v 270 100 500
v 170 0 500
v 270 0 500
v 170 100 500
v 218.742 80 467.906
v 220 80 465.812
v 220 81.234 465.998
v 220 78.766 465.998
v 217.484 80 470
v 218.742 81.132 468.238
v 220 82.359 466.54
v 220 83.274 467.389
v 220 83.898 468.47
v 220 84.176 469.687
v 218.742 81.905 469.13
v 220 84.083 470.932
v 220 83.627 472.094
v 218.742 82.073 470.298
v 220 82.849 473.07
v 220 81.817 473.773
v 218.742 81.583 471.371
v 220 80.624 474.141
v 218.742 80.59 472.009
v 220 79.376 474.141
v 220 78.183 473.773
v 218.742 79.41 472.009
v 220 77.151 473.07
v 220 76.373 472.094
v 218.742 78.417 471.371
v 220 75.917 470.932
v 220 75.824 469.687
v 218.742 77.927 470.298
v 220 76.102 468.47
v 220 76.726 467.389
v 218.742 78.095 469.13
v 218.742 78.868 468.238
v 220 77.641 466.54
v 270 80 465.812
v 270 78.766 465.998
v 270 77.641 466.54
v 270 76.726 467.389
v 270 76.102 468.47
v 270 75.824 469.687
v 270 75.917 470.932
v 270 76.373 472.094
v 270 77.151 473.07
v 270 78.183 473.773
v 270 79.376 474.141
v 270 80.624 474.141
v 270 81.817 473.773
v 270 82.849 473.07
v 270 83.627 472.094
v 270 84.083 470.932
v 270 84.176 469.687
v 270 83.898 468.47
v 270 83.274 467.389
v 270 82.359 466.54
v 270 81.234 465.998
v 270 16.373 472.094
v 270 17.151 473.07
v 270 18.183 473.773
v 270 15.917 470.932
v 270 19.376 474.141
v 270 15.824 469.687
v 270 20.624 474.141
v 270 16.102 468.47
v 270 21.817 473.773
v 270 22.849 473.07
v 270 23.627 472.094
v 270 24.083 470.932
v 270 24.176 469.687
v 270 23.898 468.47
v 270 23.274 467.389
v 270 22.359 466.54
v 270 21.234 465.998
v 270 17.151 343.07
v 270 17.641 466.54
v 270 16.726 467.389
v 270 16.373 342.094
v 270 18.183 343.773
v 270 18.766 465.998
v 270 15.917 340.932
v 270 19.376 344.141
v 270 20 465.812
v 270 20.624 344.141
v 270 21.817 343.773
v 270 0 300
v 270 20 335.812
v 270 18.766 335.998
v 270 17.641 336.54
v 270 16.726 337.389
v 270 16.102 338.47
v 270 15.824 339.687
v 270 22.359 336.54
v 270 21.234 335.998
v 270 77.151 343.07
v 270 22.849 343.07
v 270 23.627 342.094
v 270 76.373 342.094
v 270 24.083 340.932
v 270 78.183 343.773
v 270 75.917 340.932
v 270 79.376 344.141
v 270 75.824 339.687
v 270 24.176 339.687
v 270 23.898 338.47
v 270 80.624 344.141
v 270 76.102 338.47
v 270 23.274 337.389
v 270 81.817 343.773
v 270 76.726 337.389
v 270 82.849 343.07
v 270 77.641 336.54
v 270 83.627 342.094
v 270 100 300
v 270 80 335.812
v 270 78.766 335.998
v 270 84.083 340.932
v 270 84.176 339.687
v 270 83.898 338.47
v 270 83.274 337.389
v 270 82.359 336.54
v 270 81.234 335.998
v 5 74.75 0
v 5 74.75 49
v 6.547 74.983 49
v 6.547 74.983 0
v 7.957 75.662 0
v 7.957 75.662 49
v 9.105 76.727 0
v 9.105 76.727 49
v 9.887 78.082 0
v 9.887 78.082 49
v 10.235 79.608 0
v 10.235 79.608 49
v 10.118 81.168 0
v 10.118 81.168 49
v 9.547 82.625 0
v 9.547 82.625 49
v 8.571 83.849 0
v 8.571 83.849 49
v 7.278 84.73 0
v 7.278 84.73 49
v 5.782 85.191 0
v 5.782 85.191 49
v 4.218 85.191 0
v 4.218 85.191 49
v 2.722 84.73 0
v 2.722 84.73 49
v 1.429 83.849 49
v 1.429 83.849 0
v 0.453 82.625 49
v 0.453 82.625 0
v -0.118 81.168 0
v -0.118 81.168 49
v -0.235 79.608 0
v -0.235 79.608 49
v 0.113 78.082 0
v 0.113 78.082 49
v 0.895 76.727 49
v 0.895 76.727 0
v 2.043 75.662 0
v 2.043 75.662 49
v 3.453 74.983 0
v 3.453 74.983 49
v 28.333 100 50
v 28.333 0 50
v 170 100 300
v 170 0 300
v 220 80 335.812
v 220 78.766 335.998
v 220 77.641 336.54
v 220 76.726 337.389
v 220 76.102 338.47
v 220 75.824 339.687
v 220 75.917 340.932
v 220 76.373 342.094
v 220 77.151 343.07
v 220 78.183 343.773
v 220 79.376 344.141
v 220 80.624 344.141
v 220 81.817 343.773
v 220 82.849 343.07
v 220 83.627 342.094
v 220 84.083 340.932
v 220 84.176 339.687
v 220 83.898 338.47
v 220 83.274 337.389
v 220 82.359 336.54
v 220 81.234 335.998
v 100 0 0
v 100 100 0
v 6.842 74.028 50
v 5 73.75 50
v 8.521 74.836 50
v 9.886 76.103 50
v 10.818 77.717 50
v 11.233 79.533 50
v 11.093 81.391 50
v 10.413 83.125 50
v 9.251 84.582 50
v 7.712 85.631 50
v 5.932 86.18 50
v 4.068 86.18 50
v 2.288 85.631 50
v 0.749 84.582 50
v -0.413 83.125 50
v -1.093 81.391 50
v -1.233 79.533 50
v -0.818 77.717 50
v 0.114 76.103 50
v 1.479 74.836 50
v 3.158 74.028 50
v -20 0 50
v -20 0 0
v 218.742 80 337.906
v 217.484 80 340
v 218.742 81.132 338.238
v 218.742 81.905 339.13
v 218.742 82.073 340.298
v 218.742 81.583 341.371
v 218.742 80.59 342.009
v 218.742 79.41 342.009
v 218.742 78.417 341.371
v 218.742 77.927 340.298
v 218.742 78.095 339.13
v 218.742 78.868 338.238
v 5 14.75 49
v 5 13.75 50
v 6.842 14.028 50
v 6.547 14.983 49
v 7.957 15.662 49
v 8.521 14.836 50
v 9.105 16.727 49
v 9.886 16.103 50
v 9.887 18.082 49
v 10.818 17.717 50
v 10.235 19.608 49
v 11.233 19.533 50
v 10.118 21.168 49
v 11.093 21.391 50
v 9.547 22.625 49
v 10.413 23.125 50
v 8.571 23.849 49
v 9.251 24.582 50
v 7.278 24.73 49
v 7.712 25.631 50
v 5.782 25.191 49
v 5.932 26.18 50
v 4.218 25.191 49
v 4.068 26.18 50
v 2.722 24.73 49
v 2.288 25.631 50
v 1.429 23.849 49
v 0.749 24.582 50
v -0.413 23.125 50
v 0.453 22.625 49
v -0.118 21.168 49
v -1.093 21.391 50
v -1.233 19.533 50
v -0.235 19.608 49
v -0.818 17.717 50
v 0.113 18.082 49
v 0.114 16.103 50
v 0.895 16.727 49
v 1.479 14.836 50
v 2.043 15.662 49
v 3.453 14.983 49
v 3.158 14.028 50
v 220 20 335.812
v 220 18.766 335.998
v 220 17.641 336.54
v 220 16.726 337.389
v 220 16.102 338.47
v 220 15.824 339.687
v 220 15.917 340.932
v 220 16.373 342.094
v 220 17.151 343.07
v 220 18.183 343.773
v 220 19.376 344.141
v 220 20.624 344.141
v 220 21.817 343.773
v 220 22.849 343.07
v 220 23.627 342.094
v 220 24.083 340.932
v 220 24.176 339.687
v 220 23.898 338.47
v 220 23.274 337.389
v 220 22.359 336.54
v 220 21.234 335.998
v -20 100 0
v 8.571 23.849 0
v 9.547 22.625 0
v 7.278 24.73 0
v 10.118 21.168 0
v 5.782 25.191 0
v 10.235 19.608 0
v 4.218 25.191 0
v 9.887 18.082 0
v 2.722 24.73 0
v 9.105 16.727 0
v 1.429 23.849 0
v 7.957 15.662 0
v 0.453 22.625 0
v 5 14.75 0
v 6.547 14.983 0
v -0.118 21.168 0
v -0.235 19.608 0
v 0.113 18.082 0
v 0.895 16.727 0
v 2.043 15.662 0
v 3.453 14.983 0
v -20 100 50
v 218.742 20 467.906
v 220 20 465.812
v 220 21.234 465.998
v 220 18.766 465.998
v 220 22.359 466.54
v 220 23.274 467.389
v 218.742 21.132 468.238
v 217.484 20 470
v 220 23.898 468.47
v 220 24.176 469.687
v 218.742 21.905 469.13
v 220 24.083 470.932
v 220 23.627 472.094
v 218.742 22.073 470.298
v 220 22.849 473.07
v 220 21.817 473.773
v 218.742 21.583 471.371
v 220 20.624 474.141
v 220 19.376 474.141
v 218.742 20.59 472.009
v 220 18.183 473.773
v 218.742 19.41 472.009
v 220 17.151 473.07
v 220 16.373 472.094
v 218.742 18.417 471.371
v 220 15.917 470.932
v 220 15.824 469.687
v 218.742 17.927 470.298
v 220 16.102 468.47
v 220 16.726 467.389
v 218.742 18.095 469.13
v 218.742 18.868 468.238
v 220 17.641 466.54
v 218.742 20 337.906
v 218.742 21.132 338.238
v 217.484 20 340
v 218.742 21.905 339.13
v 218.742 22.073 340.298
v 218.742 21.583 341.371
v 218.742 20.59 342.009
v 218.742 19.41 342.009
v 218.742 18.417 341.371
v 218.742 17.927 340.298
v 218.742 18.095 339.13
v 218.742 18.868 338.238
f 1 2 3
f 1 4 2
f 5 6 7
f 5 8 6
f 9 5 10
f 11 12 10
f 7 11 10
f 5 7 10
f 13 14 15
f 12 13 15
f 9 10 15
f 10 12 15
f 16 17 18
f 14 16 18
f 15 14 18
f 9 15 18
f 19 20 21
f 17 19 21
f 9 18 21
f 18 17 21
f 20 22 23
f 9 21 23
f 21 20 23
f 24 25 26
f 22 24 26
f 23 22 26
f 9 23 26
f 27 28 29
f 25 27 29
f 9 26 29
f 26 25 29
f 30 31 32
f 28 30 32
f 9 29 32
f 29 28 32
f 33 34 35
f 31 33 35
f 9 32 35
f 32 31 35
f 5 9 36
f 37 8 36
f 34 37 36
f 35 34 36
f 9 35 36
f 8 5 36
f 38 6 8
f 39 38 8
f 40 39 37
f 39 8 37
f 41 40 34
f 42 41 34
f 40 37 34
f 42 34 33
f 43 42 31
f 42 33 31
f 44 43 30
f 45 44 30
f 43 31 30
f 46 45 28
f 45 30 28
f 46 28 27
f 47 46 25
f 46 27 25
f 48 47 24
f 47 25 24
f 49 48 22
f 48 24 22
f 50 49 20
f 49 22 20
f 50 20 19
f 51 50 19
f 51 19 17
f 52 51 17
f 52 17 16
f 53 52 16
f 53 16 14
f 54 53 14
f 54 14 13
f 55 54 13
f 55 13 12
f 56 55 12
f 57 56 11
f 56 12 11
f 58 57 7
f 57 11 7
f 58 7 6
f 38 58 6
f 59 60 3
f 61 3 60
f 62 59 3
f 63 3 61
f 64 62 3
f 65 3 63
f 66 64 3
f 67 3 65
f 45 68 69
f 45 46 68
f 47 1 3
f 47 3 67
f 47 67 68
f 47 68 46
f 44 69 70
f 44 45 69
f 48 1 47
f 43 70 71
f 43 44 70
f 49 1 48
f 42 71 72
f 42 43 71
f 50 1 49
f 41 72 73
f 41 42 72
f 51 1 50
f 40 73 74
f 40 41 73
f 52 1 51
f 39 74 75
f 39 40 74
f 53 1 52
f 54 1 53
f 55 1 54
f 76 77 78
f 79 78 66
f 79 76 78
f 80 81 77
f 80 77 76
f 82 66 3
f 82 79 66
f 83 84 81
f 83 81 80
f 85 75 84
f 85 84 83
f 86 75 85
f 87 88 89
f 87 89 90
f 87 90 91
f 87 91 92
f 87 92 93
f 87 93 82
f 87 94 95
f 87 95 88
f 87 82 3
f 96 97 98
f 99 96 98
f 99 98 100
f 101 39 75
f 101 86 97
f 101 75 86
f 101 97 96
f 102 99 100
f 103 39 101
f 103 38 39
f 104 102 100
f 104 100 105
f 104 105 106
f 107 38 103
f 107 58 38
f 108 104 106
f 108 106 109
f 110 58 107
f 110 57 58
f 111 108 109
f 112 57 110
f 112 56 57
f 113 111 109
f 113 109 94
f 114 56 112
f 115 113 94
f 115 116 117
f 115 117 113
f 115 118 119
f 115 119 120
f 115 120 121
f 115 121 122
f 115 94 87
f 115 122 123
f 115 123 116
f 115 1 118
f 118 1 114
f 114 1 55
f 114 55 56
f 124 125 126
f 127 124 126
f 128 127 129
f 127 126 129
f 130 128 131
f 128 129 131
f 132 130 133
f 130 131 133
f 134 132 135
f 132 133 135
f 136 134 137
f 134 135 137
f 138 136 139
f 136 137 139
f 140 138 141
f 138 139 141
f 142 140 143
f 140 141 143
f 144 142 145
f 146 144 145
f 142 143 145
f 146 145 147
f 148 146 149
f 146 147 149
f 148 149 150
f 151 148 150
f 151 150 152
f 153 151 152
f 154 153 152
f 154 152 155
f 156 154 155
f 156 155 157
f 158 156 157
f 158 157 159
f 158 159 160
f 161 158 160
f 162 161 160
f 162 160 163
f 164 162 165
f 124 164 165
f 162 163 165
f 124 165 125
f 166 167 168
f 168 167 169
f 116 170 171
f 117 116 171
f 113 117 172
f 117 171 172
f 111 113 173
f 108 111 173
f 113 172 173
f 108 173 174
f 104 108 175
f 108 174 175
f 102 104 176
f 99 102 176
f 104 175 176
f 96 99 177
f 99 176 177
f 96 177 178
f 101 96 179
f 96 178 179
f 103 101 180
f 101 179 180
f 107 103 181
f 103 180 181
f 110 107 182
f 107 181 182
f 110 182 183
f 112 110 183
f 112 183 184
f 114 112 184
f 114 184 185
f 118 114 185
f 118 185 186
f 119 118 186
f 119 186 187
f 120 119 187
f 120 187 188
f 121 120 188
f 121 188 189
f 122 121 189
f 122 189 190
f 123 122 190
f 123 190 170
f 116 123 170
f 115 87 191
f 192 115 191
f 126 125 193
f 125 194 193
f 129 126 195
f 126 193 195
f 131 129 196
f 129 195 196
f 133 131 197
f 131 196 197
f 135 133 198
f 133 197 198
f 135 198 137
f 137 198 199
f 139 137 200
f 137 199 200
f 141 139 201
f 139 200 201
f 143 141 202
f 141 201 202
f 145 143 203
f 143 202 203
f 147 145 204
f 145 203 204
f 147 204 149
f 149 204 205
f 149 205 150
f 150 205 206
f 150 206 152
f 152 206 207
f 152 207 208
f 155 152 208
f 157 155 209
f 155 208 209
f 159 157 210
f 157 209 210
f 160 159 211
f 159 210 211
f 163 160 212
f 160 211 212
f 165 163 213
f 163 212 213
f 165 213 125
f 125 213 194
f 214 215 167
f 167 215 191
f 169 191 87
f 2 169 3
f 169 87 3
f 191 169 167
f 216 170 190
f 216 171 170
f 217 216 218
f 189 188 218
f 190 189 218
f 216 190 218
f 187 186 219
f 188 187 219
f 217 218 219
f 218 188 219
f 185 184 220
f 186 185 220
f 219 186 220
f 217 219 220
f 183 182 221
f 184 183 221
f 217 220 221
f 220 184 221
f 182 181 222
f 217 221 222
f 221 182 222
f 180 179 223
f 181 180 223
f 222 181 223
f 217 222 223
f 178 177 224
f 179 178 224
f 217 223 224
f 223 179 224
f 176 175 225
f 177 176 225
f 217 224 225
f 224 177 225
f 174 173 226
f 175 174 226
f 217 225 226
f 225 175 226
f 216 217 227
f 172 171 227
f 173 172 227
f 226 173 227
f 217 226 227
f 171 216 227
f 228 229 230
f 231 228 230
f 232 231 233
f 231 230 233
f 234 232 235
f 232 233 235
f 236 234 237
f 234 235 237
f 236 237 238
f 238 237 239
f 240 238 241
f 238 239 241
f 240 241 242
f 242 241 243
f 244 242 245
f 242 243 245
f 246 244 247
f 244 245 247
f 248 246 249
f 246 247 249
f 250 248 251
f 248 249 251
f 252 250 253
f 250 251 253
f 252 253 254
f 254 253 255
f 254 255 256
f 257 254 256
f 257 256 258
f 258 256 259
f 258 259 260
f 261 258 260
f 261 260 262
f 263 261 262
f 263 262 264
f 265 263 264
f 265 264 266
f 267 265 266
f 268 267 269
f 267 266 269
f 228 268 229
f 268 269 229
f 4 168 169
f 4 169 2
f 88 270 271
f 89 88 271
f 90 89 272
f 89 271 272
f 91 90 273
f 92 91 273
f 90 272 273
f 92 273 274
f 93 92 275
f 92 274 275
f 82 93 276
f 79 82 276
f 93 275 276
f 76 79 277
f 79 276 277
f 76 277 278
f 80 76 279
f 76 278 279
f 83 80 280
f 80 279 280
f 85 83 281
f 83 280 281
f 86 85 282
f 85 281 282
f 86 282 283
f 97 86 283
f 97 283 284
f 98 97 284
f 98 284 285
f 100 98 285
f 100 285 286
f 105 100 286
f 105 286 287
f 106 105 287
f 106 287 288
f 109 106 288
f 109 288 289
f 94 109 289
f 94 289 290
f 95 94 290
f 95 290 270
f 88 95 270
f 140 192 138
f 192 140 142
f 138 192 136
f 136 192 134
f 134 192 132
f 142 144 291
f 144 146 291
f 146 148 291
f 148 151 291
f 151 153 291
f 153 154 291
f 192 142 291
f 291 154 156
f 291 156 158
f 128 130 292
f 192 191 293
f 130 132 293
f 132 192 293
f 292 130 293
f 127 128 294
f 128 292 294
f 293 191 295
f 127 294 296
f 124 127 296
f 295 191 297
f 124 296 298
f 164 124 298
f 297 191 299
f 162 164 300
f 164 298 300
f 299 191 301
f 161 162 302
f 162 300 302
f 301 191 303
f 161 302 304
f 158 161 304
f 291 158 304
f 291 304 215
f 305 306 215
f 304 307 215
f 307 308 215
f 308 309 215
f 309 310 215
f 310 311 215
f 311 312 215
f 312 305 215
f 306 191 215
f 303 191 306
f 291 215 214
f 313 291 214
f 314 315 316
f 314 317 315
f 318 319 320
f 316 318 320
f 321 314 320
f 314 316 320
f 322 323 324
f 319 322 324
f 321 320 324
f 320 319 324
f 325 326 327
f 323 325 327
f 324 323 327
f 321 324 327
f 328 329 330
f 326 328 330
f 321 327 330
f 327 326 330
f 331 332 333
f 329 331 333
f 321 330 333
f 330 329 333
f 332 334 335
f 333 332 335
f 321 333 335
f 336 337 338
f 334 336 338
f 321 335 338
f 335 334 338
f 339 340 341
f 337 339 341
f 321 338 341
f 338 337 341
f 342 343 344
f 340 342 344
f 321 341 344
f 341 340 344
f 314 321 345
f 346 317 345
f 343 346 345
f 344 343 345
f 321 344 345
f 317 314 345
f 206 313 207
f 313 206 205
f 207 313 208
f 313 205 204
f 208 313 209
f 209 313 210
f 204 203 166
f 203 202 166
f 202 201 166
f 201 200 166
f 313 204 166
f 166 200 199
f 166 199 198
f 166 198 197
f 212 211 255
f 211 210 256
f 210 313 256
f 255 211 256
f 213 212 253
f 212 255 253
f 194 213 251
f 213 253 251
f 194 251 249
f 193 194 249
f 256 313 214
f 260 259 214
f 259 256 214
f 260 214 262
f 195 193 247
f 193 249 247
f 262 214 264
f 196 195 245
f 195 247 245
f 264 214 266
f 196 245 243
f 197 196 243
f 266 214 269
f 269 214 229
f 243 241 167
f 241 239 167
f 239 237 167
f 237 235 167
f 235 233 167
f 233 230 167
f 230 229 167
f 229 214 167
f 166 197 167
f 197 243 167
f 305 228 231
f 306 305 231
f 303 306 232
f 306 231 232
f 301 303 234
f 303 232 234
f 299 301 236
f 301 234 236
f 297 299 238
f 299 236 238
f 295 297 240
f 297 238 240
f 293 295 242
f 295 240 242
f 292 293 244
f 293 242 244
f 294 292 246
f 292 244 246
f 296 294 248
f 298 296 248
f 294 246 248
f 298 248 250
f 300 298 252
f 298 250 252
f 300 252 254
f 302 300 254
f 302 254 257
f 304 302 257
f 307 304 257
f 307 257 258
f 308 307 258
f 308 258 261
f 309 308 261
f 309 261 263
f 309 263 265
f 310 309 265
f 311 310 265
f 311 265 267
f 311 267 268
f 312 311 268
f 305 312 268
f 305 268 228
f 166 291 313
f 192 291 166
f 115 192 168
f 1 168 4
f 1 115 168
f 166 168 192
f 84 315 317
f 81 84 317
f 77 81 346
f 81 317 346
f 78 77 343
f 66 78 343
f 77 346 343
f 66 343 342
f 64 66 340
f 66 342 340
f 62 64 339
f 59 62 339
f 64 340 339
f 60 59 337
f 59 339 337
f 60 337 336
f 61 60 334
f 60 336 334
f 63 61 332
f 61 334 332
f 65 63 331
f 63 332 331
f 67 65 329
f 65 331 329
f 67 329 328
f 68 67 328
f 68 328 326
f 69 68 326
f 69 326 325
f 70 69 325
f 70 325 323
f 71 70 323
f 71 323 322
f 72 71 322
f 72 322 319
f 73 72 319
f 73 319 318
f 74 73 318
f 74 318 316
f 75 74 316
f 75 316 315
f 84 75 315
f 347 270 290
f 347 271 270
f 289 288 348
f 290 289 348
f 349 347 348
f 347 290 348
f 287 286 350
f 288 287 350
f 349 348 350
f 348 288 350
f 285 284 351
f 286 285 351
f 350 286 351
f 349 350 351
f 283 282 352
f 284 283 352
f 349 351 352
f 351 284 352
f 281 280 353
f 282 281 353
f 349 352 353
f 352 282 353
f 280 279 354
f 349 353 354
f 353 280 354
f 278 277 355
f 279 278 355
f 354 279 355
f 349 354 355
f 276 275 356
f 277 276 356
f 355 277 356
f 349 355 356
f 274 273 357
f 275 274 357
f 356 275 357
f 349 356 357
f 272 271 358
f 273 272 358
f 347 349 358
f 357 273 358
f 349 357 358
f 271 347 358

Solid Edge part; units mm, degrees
sketch "Sketch1" plane through (0, 0, 0) normal (0, -1, 0) x (1, 0, 0)
  line L0 (270, 300) -> (100, 0)
  line L1 (100, 0) -> (0, 0)
  line L2 (0, 0) -> (170, 300)
  line L3 (170, 300) -> (270, 300)
extrude "Protrusion1" add sketch "Sketch1" against normal blind 100
sketch "Sketch2" plane through (136.6025, 0, 150) normal (0, -1, 0) x (1, 0, 0)
  line L0 (-108.2692, -100) -> (-108.2692, -150)
  line L1 (-156.6025, -100) -> (-108.2692, -100)
  line L2 (-156.6025, -150) -> (-156.6025, -100)
  line L3 (-136.6025, -150) -> (-156.6025, -150)
extrude "Extrusionsausprägung_2" add sketch "Sketch2" against normal blind 100 material side at (28.3833, 0, 25)
hole "Bohrung_1" at (5, 20, 50) direction (0, 0, -1) diameter 10.5 end up to next start chamfer 1 start chamfer angle 45
hole "Hole1" at (5, 80, 50) direction (0, 0, -1) diameter 10.5 end up to next start chamfer 1 start chamfer angle 45
sketch "Sketch3" plane through (126.0363, 100, 150) normal (0, 1, 0) x (1, 0, 0)
  line L0 (143.9637, -350) -> (143.9637, -150)
  line L1 (143.9637, -150) -> (43.9637, -150)
  line L2 (43.9637, -150) -> (43.9637, -350)
  line L3 (43.9637, -350) -> (143.9637, -350)
extrude "Extrusionsausprägung_3" add sketch "Sketch3" against normal blind 100
hole "Bohrung_5" at (270, 20, 470) direction (-1, 0, 0) diameter 8.376 depth 50 tip angle 118
hole "Hole2" at (270, 80, 470) direction (-1, 0, 0) diameter 8.376 depth 50 tip angle 118
hole "Hole3" at (270, 80, 340) direction (-1, 0, 0) diameter 8.376 depth 50 tip angle 118
hole "Hole4" at (270, 20, 340) direction (-1, 0, 0) diameter 8.376 depth 50 tip angle 118
